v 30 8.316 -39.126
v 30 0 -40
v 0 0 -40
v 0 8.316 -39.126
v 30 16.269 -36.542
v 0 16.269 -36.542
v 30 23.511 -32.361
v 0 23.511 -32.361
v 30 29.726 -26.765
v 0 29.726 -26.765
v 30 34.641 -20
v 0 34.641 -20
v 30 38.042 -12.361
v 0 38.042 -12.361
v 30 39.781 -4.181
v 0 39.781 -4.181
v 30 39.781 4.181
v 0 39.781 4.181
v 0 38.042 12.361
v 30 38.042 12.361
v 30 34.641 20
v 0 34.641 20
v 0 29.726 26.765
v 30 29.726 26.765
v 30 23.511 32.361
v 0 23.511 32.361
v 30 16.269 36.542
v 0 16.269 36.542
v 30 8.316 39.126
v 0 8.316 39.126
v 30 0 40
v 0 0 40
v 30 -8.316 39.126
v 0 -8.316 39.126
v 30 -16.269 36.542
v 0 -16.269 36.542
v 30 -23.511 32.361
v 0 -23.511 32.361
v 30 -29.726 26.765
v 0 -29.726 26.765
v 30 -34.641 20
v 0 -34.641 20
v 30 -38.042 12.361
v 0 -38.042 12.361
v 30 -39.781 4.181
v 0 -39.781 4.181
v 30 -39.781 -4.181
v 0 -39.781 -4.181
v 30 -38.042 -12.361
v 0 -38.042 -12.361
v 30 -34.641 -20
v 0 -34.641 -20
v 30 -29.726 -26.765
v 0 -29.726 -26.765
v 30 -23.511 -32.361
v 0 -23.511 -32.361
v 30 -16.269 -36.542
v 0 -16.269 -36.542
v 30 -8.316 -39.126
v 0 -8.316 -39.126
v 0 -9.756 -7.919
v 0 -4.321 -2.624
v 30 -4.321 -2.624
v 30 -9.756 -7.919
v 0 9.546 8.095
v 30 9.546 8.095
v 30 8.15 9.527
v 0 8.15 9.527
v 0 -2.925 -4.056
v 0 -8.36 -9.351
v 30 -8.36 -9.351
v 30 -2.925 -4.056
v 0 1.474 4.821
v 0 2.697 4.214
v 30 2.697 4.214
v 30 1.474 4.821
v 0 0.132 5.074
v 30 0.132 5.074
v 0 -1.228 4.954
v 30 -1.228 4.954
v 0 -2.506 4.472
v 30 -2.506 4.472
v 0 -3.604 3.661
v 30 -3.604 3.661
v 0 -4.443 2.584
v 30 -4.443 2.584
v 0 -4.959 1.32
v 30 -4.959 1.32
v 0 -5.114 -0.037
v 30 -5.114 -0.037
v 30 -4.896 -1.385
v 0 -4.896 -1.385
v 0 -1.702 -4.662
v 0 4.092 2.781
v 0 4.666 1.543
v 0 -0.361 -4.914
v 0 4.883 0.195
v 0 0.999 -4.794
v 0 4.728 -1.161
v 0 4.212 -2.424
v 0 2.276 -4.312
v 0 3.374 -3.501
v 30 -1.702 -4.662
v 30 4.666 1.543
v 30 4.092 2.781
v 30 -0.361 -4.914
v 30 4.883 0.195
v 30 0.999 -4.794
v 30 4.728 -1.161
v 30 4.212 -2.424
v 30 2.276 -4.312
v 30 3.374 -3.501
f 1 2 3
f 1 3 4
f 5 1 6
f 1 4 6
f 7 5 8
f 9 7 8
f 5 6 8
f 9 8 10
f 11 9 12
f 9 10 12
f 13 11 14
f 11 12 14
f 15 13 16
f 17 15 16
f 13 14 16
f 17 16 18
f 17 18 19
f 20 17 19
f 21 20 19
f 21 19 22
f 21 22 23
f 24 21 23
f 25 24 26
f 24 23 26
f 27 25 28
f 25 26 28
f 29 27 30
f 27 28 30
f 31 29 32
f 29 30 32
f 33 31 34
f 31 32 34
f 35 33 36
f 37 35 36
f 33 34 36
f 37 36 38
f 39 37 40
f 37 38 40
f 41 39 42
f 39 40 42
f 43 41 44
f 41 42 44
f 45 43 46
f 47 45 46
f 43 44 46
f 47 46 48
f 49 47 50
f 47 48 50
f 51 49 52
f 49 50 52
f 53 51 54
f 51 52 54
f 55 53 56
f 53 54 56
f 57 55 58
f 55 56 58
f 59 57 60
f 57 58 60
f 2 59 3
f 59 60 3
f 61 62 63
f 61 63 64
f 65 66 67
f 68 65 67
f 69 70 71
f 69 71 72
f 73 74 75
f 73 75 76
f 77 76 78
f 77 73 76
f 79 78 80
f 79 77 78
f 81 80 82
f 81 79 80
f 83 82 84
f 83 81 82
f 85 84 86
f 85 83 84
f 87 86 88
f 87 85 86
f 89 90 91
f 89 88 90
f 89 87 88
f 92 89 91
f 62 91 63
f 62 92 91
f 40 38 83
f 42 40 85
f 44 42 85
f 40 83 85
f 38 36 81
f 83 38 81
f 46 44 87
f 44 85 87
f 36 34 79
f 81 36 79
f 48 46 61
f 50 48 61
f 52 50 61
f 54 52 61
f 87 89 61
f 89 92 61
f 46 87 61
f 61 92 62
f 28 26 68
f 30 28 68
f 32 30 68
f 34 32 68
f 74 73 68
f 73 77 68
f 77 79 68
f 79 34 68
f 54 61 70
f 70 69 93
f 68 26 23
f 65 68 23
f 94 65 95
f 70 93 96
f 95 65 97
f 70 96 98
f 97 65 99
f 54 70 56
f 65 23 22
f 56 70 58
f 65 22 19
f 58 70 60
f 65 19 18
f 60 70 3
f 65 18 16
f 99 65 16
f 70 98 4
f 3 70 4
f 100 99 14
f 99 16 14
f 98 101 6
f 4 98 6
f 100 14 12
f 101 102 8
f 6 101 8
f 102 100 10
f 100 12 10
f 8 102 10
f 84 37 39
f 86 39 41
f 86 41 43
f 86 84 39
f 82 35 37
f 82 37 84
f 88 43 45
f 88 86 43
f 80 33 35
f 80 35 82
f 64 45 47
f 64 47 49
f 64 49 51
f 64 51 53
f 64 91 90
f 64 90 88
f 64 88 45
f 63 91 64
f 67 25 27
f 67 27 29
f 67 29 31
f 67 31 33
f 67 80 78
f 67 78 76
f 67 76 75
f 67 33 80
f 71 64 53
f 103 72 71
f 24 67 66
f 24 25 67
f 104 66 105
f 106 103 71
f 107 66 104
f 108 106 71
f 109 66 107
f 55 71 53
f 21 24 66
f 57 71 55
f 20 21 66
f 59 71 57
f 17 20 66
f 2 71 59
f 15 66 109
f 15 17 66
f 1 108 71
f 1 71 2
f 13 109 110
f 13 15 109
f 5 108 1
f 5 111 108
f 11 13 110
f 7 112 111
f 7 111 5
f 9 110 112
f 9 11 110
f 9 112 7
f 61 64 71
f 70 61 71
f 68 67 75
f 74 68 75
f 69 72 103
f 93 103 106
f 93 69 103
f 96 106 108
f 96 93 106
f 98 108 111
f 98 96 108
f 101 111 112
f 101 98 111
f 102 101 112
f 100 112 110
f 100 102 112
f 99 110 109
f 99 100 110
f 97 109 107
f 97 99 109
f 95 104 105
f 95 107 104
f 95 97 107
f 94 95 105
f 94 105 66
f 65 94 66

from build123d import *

# Parameters (mm, degrees)
SKETCH_1_R          = 40
EXTRUDE_1_DEPTH     = 30
CUT_EXTRUDE_1_DEPTH = 31


with BuildPart() as part:
    # 草图1 → 凸台-拉伸1 (new body)
    with BuildSketch(Plane(origin=(0, 0, 0), x_dir=(0, 0, -1), z_dir=(1, 0, 0))):
        Circle(SKETCH_1_R)
    extrude(amount=EXTRUDE_1_DEPTH)

    # 草图2 → 切除-拉伸1 (cut, through all)
    with BuildSketch(Plane(origin=(0, 0, 0), x_dir=(0, 0, -1), z_dir=(1, 0, 0))):
        with BuildLine():
            Line((2.623542319, -4.321331792), (7.918602352, -9.756071778))
            Line((7.918602352, -9.756071778), (9.351104694, -8.360386627))
            Line((9.351104694, -8.360386627), (4.055722569, -2.925316052))
            ThreePointArc((4.055722569, -2.925316052), (3.501362158, 3.37399969), (-2.781388072, 4.092152751))
            Line((-2.781388072, 4.092152751), (-8.094959692, 9.545892647))
            Line((-8.094959692, 9.545892647), (-9.527462034, 8.150207496))
            Line((-9.527462034, 8.150207496), (-4.214212506, 2.696798189))
            ThreePointArc((-4.214212506, 2.696798189), (-3.661149551, -3.604426065), (2.623542319, -4.321331792))
        make_face()
    extrude(amount=CUT_EXTRUDE_1_DEPTH, mode=Mode.SUBTRACT)


solid = part.part
